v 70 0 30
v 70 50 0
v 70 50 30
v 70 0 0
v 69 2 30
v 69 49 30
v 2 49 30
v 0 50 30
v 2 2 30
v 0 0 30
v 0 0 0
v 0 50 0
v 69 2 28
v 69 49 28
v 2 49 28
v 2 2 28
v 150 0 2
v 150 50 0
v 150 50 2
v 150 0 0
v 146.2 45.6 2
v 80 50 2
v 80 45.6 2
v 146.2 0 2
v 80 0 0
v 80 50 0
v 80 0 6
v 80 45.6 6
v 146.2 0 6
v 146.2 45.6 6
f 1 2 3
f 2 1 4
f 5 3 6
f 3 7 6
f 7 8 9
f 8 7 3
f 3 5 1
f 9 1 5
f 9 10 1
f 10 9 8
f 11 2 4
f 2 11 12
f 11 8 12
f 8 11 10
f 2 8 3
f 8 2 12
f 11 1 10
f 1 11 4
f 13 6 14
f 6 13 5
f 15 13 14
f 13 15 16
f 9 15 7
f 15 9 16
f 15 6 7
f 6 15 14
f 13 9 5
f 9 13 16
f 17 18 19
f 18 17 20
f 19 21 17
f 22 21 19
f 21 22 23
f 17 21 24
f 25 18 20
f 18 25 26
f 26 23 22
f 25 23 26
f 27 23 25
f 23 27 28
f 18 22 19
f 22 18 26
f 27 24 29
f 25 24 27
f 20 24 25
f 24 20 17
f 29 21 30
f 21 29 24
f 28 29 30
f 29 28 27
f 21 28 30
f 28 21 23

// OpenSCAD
// Two-part enclosure for a small electronics board (e.g. Arduino-based temperature logger)
// Print orientation: both parts lie on the bed (z = 0), side by side, with a 10 mm gap.
// The box is open-topped; the lid is printed upside down and slides into the box opening.
// Units: mm. No external libraries.

// ---------------- Parameters ----------------
box_x      = 70;    // outer length of box (X)
box_y      = 50;    // outer width of box (Y)
box_h      = 30;    // overall height of box (Z)
wall       = 2;     // wall thickness (X and Y)
floor      = 2;     // floor thickness under the board (Z)

lip_t      = 1.5;   // lip wall thickness (Z)
lip_h      = 4;     // lip height above the plate (Z)
lip_x      = 65.6;  // outer length of lip (X)
lip_y      = 45.6;  // outer width of lip (Y)
lip_over   = 0.2;   // clearance between lip outer size and box opening (each side)

gap        = 10;    // horizontal gap between box and lid (X)
eps        = 0.5;   // cutter overshoot past faces

$fn = 64;

// ---------------- Derived ----------------
box_i_x = box_x - 2 * wall;   // 66 mm inside length
box_i_y = box_y - 2 * wall;   // 46 mm inside width
lip_x1  = box_i_x - lip_over; // 65.8 mm (inner edge of lip aligns with box inner wall)
lip_x2  = box_i_x + lip_over; // 66.2 mm (outer edge of lip)

// ---------------- Model ----------------
union() {
    // Box: 2 mm walls, 2 mm floor, open top
    difference() {
        cube([box_x, box_y, box_h]);
        // open the top (cut down from z = box_h - floor)
        translate([wall, wall, box_h - floor])
            cube([box_i_x + 1, box_i_y + 1, floor + 1]);
    }

    // Lid: plate 70 x 50 x 2 mm with a centred rectangular lip on top, printed upside down
    translate([box_x + gap, 0, 0])
        difference() {
            union() {
                // base plate
                cube([box_x, box_y, 2]);
                // lip: wall 1.5 mm thick, 4 mm tall above the plate
                translate([0, 0, 2])
                    cube([lip_x2, lip_y, lip_h]);
            }
            // cut the pocket the lip slides into (extends past the box top face)
            translate([wall, wall, box_h - floor])
                cube([box_i_x + 1, box_i_y + 1, floor + 1 + eps]);
        }
}
